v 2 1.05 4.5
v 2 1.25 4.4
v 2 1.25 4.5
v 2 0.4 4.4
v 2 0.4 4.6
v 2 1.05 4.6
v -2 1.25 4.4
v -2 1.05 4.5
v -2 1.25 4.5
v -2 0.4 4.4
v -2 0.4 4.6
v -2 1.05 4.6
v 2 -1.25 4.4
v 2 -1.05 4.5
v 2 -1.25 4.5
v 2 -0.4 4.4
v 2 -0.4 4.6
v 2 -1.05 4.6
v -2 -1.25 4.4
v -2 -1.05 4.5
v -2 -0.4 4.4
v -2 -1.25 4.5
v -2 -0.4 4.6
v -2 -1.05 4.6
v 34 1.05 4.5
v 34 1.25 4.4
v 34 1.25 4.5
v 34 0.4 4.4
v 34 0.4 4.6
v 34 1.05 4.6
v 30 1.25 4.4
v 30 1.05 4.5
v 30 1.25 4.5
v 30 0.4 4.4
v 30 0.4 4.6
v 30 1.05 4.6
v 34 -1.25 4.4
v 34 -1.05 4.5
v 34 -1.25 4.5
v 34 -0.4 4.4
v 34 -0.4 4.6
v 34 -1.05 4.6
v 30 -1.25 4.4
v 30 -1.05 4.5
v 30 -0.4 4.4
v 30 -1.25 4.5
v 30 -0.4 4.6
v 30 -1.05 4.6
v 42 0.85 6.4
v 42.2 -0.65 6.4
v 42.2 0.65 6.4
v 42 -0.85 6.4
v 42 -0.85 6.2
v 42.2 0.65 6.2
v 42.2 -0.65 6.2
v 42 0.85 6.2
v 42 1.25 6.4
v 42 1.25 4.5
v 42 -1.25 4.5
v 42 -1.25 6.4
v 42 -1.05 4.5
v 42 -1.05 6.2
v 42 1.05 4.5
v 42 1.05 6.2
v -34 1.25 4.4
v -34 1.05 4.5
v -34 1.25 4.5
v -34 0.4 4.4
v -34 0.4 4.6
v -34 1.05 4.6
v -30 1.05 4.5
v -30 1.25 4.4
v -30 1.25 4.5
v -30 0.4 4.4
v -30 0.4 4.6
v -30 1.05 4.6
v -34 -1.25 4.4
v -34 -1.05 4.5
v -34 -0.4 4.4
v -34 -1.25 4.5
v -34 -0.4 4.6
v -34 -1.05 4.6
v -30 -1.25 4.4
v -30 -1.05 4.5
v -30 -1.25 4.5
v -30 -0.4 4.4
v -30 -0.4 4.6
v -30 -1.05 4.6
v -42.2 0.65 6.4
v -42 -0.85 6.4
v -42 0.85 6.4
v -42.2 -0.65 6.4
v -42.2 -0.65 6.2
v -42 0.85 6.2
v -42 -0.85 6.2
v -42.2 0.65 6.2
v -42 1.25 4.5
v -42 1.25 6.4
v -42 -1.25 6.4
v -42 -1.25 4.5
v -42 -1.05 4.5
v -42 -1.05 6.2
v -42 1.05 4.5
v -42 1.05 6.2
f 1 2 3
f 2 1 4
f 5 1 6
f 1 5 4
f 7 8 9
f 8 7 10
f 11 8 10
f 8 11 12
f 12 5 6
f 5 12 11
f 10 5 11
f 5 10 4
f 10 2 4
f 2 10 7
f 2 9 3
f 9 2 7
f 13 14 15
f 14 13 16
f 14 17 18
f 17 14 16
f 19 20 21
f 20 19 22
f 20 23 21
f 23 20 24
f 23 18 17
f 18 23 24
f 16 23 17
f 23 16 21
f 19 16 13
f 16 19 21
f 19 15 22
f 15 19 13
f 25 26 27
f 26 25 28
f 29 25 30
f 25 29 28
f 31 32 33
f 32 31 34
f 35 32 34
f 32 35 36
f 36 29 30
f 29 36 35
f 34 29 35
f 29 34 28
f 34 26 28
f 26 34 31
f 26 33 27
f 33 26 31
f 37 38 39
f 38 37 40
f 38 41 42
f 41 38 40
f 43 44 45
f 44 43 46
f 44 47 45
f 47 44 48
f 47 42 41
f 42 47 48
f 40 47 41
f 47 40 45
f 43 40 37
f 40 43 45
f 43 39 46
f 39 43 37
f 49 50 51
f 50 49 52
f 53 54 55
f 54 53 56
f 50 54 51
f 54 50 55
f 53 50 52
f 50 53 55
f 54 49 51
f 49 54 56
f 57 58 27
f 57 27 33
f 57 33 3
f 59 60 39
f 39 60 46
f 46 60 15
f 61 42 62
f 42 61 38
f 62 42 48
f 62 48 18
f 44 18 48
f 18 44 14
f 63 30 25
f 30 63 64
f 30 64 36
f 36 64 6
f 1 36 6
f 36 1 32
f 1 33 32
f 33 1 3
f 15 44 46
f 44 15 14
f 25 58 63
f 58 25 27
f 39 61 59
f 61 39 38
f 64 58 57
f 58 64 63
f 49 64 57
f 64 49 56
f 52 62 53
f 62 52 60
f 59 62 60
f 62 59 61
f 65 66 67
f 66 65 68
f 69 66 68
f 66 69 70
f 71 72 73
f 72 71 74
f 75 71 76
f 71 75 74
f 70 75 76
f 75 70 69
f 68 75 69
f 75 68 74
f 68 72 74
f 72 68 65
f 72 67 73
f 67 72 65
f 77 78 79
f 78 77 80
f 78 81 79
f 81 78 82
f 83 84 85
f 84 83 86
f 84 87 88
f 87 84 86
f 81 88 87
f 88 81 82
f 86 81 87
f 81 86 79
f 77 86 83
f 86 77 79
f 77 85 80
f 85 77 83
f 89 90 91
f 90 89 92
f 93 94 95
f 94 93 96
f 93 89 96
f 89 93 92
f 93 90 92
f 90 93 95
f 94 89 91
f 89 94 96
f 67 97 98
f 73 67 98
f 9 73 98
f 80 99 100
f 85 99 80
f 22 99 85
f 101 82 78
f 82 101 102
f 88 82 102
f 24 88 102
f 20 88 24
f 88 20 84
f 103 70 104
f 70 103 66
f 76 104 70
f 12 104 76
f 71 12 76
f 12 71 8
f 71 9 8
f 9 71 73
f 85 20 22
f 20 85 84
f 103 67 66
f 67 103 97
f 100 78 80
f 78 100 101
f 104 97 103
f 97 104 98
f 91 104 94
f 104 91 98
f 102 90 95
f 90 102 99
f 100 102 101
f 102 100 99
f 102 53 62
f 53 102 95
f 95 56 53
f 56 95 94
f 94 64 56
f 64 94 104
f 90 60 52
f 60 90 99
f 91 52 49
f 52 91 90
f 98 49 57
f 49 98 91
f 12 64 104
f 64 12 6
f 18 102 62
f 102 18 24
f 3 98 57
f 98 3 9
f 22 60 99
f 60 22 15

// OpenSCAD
// file: ../p/rect3.scad
use <../lib.scad>
function ldraw_lib__rect3() = [
// 0 Rectangle with 3 Edges
// 0 Name: rect3.dat
// 0 Author: Mark Kennedy [mkennedy]
// 0 !LDRAW_ORG Primitive UPDATE 2010-01
// 0 !LICENSE Licensed under CC BY 4.0 : see CAreadme.txt
// 
// 0 BFC CERTIFY CCW
  [0,"BFC","CERTIFY"],
  [0,"BFC","CCW"],
// 
// 0 !HISTORY 2003-08-01 [PTadmin] Official Update 2003-02
// 0 !HISTORY 2007-06-24 [PTadmin] Header formatted for Contributor Agreement
// 0 !HISTORY 2008-07-01 [PTadmin] Official Update 2008-01
// 0 !HISTORY 2010-01-17 [mikeheide] Change winding to CCW
// 0 !HISTORY 2010-04-05 [PTadmin] Official Update 2010-01
// 
// 
// 2 24 1 0 1 -1 0 1
  [2,24,1,0,1,-1,0,1],
// 2 24 1 0 1 1 0 -1
  [2,24,1,0,1,1,0,-1],
// 2 24 -1 0 1 -1 0 -1
  [2,24,-1,0,1,-1,0,-1],
// 4 16 -1 0 1 -1 0 -1 1 0 -1 1 0 1
  [4,16,-1,0,1,-1,0,-1,1,0,-1,1,0,1],
// 0 //
];
module ldraw_lib__rect3(step=0, col=false, unit=2/5, alt=false, line=0.2, solid=!$preview)
    makepoly(ldraw_lib__rect3(), step=step, col=col, unit=unit, alt=alt, line=line, solid=solid);
ldraw_lib__rect3(line=0.2);
// file: ../p/rect.scad
use <../lib.scad>
function ldraw_lib__rect() = [
// 0 Rectangle
// 0 Name: rect.dat
// 0 Author: James Jessiman
// 0 !LDRAW_ORG Primitive UPDATE 2010-01
// 0 !LICENSE Licensed under CC BY 4.0 : see CAreadme.txt
// 
// 0 BFC CERTIFY CCW
  [0,"BFC","CERTIFY"],
  [0,"BFC","CCW"],
// 
// 0 !HISTORY 2002-04-05 [hafhead] Added BFC statement
// 0 !HISTORY 2002-04-25 [PTadmin] Official Update 2002-02
// 0 !HISTORY 2007-06-24 [PTadmin] Header formatted for Contributor Agreement
// 0 !HISTORY 2008-07-01 [PTadmin] Official Update 2008-01
// 0 !HISTORY 2010-01-17 [mikeheide] changed winding to CCW
// 0 !HISTORY 2010-04-05 [PTadmin] Official Update 2010-01
// 
// 
// 2 24 1 0 1 -1 0 1
  [2,24,1,0,1,-1,0,1],
// 2 24 -1 0 1 -1 0 -1
  [2,24,-1,0,1,-1,0,-1],
// 2 24 -1 0 -1 1 0 -1
  [2,24,-1,0,-1,1,0,-1],
// 2 24 1 0 -1 1 0 1
  [2,24,1,0,-1,1,0,1],
// 4 16 -1 0 1 -1 0 -1 1 0 -1 1 0 1
  [4,16,-1,0,1,-1,0,-1,1,0,-1,1,0,1],
// 0
];
module ldraw_lib__rect(step=0, col=false, unit=2/5, alt=false, line=0.2, solid=!$preview)
    makepoly(ldraw_lib__rect(), step=step, col=col, unit=unit, alt=alt, line=line, solid=solid);
ldraw_lib__rect(line=0.2);
// file: ../p/box2-7.scad
use <../lib.scad>
function ldraw_lib__box2_7() = [
// 0 Box with  2 Faces without  7 Edges
// 0 Name: box2-7.dat
// 0 Author: Willy Tschager [Holly-Wood]
// 0 !LDRAW_ORG Primitive UPDATE 2024-01
// 0 !LICENSE Licensed under CC BY 4.0 : see CAreadme.txt
// 
// 0 BFC CERTIFY CCW
  [0,"BFC","CERTIFY"],
  [0,"BFC","CCW"],
// 
// 0 !HISTORY 2009-05-02 [PTadmin] Official Update 2009-01
// 0 !HISTORY 2024-01-02 [Holly-Wood] Complete re-write, original by guyvivan
// 0 !HISTORY 2024-01-29 [OrionP] Official Update 2024-01
// 
// 2 24 -1 1 -1 -1 1 1
  [2,24,-1,1,-1,-1,1,1],
// 2 24 1 1 1 1 1 -1
  [2,24,1,1,1,1,1,-1],
// 4 16 -1 1 1 1 1 1 1 1 -1 -1 1 -1
  [4,16,-1,1,1,1,1,1,1,1,-1,-1,1,-1],
// 
// 2 24 -1 1 1 -1 -1 1
  [2,24,-1,1,1,-1,-1,1],
// 2 24 1 1 1 1 -1 1
  [2,24,1,1,1,1,-1,1],
// 4 16 1 -1 1 1 1 1 -1 1 1 -1 -1 1
  [4,16,1,-1,1,1,1,1,-1,1,1,-1,-1,1],
// 
// 2 24 -1 1 1 1 1 1
  [2,24,-1,1,1,1,1,1],
];
module ldraw_lib__box2_7(step=0, col=false, unit=2/5, alt=false, line=0.2, solid=!$preview)
    makepoly(ldraw_lib__box2_7(), step=step, col=col, unit=unit, alt=alt, line=line, solid=solid);
ldraw_lib__box2_7(line=0.2);
// file: ../p/box2-5.scad
use <../lib.scad>
function ldraw_lib__box2_5() = [
// 0 Box with 2 Faces without 5 Edges
// 0 Name: box2-5.dat
// 0 Author: Steffen [Steffen]
// 0 !LDRAW_ORG Primitive UPDATE 2003-03
// 0 !LICENSE Licensed under CC BY 4.0 : see CAreadme.txt
// 
// 0 BFC CERTIFY CCW
  [0,"BFC","CERTIFY"],
  [0,"BFC","CCW"],
// 
// 0 !HISTORY 2003-12-19 [PTadmin] Official Update 2003-03
// 0 !HISTORY 2007-06-24 [PTadmin] Header formatted for Contributor Agreement
// 0 !HISTORY 2008-07-01 [PTadmin] Official Update 2008-01
// 
// 
// 2 24 1 1 1 -1 1 1
  [2,24,1,1,1,-1,1,1],
// 2 24 1 1 -1 -1 1 -1
  [2,24,1,1,-1,-1,1,-1],
// 2 24 1 -1 1 -1 -1 1
  [2,24,1,-1,1,-1,-1,1],
// 2 24 -1 -1 1 -1 1 1
  [2,24,-1,-1,1,-1,1,1],
// 2 24 1 -1 1 1 1 1
  [2,24,1,-1,1,1,1,1],
// 2 24 -1 1 -1 -1 1 1
  [2,24,-1,1,-1,-1,1,1],
// 2 24 1 1 -1 1 1 1
  [2,24,1,1,-1,1,1,1],
// 4 16 1 1 1 1 1 -1 -1 1 -1 -1 1 1
  [4,16,1,1,1,1,1,-1,-1,1,-1,-1,1,1],
// 4 16 1 1 1 -1 1 1 -1 -1 1 1 -1 1
  [4,16,1,1,1,-1,1,1,-1,-1,1,1,-1,1],
// 0
];
module ldraw_lib__box2_5(step=0, col=false, unit=2/5, alt=false, line=0.2, solid=!$preview)
    makepoly(ldraw_lib__box2_5(), step=step, col=col, unit=unit, alt=alt, line=line, solid=solid);
ldraw_lib__box2_5(line=0.2);
// file: s/u9628s01.scad
use <../../lib.scad>
use <../../p/box2-5.scad>
use <../../p/rect.scad>
use <../../p/rect3.scad>
use <u9611s02.scad>
function ldraw_lib__s__u9628s01() = [
// 0 ~Train Track  9V Switch Right - Straight Metal Rail, Centre Section of Frog Rail, Half
// 0 Name: s\u9628s01.dat
// 0 Author: Max Martin Richter [MMR1988]
// 0 !LDRAW_ORG Subpart UPDATE 2025-08
// 0 !LICENSE Licensed under CC BY 4.0 : see CAreadme.txt
// 
// 0 BFC CERTIFY CCW
  [0,"BFC","CERTIFY"],
  [0,"BFC","CCW"],
// 
// 0 !HISTORY 2025-08-31 [OrionP] Official Update 2025-08
// 
// 1 16 80 0 0 1 0 0 0 1 0 0 0 1 s\u9611s02.dat
  [1,16,80,0,0,1,0,0,0,1,0,0,0,1, ldraw_lib__s__u9611s02()],
// 
// 4 16 105 -16 -2.125 105.5 -16 -1.625 105.5 -16 1.625 105 -16 2.125
  [4,16,105,-16,-2.125,105.5,-16,-1.625,105.5,-16,1.625,105,-16,2.125],
// 4 16 105.5 -15.5 1.625 105.5 -15.5 -1.625 105 -15.5 -2.125 105 -15.5 2.125
  [4,16,105.5,-15.5,1.625,105.5,-15.5,-1.625,105,-15.5,-2.125,105,-15.5,2.125],
// 1 16 105.25 -15.75 -.25 0 .25 0 .25 0 0 0 .25 -1.625 box2-5.dat
  [1,16,105.25,-15.75,-.25,0,.25,0,.25,0,0,0,.25,-1.625, ldraw_lib__box2_5()],
// 1 16 105.25 -15.75 1.875 0 -1 -.25 .25 0 0 0 0 .25 rect3.dat
  [1,16,105.25,-15.75,1.875,0,-1,-.25,.25,0,0,0,0,.25, ldraw_lib__rect3()],
// 
// 3 16 105 -16 3.125 105 -11.25 3.125 85 -11.25 3.125
  [3,16,105,-16,3.125,105,-11.25,3.125,85,-11.25,3.125],
// 3 16 105 -16 3.125 85 -11.25 3.125 75 -11.25 3.125
  [3,16,105,-16,3.125,85,-11.25,3.125,75,-11.25,3.125],
// 3 16 105 -16 3.125 75 -11.25 3.125 5 -11.25 3.125
  [3,16,105,-16,3.125,75,-11.25,3.125,5,-11.25,3.125],
// 
// 3 16 105 -11.25 -3.125 105 -16 -3.125 85 -11.25 -3.125
  [3,16,105,-11.25,-3.125,105,-16,-3.125,85,-11.25,-3.125],
// 3 16 85 -11.25 -3.125 105 -16 -3.125 75 -11.25 -3.125
  [3,16,85,-11.25,-3.125,105,-16,-3.125,75,-11.25,-3.125],
// 3 16 75 -11.25 -3.125 105 -16 -3.125 5 -11.25 -3.125
  [3,16,75,-11.25,-3.125,105,-16,-3.125,5,-11.25,-3.125],
// 
// 4 16 105 -11.25 -2.625 85 -11.25 -2.625 85 -11.5 -2.625 105 -15.5 -2.625
  [4,16,105,-11.25,-2.625,85,-11.25,-2.625,85,-11.5,-2.625,105,-15.5,-2.625],
// 3 16 105 -15.5 -2.625 85 -11.5 -2.625 75 -11.5 -2.625
  [3,16,105,-15.5,-2.625,85,-11.5,-2.625,75,-11.5,-2.625],
// 3 16 105 -15.5 -2.625 75 -11.5 -2.625 5 -11.5 -2.625
  [3,16,105,-15.5,-2.625,75,-11.5,-2.625,5,-11.5,-2.625],
// 4 16 5 -11.25 -2.625 5 -11.5 -2.625 75 -11.5 -2.625 75 -11.25 -2.625
  [4,16,5,-11.25,-2.625,5,-11.5,-2.625,75,-11.5,-2.625,75,-11.25,-2.625],
// 
// 4 16 85 -11.5 2.625 85 -11.25 2.625 105 -11.25 2.625 105 -15.5 2.625
  [4,16,85,-11.5,2.625,85,-11.25,2.625,105,-11.25,2.625,105,-15.5,2.625],
// 3 16 85 -11.5 2.625 105 -15.5 2.625 75 -11.5 2.625
  [3,16,85,-11.5,2.625,105,-15.5,2.625,75,-11.5,2.625],
// 3 16 75 -11.5 2.625 105 -15.5 2.625 5 -11.5 2.625
  [3,16,75,-11.5,2.625,105,-15.5,2.625,5,-11.5,2.625],
// 4 16 75 -11.5 2.625 5 -11.5 2.625 5 -11.25 2.625 75 -11.25 2.625
  [4,16,75,-11.5,2.625,5,-11.5,2.625,5,-11.25,2.625,75,-11.25,2.625],
// 
// 1 16 40 -11.25 2.875 35 0 0 0 -1 0 0 0 .25 rect.dat
  [1,16,40,-11.25,2.875,35,0,0,0,-1,0,0,0,.25, ldraw_lib__rect()],
// 1 16 40 -11.25 -2.875 35 0 0 0 -1 0 0 0 -.25 rect.dat
  [1,16,40,-11.25,-2.875,35,0,0,0,-1,0,0,0,-.25, ldraw_lib__rect()],
// 1 16 95 -11.25 2.875 10 0 0 0 -1 0 0 0 .25 rect.dat
  [1,16,95,-11.25,2.875,10,0,0,0,-1,0,0,0,.25, ldraw_lib__rect()],
// 1 16 95 -11.25 -2.875 10 0 0 0 -1 0 0 0 -.25 rect.dat
  [1,16,95,-11.25,-2.875,10,0,0,0,-1,0,0,0,-.25, ldraw_lib__rect()],
// 
// 4 16 105 -11.25 3.125 105 -16 3.125 105 -15.5 2.625 105 -11.25 2.625
  [4,16,105,-11.25,3.125,105,-16,3.125,105,-15.5,2.625,105,-11.25,2.625],
// 4 16 105 -15.5 2.625 105 -16 3.125 105 -16 2.125 105 -15.5 2.125
  [4,16,105,-15.5,2.625,105,-16,3.125,105,-16,2.125,105,-15.5,2.125],
// 4 16 105 -15.5 -2.125 105 -16 -2.125 105 -16 -3.125 105 -15.5 -2.625
  [4,16,105,-15.5,-2.125,105,-16,-2.125,105,-16,-3.125,105,-15.5,-2.625],
// 4 16 105 -15.5 -2.625 105 -16 -3.125 105 -11.25 -3.125 105 -11.25 -2.625
  [4,16,105,-15.5,-2.625,105,-16,-3.125,105,-11.25,-3.125,105,-11.25,-2.625],
];
module ldraw_lib__s__u9628s01(step=0, col=false, unit=2/5, alt=false, line=0.2, solid=!$preview)
    makepoly(ldraw_lib__s__u9628s01(), step=step, col=col, unit=unit, alt=alt, line=line, solid=solid);
ldraw_lib__s__u9628s01(line=0.2);
// file: s/u9611s02.scad
use <../../lib.scad>
use <../../p/box2-5.scad>
use <../../p/box2-7.scad>
function ldraw_lib__s__u9611s02() = [
// 0 ~Train Track  9V Straight - Metal Rail, Clamp
// 0 Name: s\u9611s02.dat
// 0 Author: Max Martin Richter [MMR1988]
// 0 !LDRAW_ORG Subpart UPDATE 2025-02
// 0 !LICENSE Licensed under CC BY 4.0 : see CAreadme.txt
// 
// 0 BFC CERTIFY CCW
  [0,"BFC","CERTIFY"],
  [0,"BFC","CCW"],
// 
// 0 !HISTORY 2025-02-27 [OrionP] Official Update 2025-02
// 
// 4 16 5 -11 3.125 5 -11.25 3.125 5 -11.25 2.625 5 -11 1
  [4,16,5,-11,3.125,5,-11.25,3.125,5,-11.25,2.625,5,-11,1],
// 4 16 5 -11.25 2.625 5 -11.5 2.625 5 -11.5 1 5 -11 1
  [4,16,5,-11.25,2.625,5,-11.5,2.625,5,-11.5,1,5,-11,1],
// 4 16 -5 -11.25 2.625 -5 -11.25 3.125 -5 -11 3.125 -5 -11 1
  [4,16,-5,-11.25,2.625,-5,-11.25,3.125,-5,-11,3.125,-5,-11,1],
// 4 16 -5 -11.25 2.625 -5 -11 1 -5 -11.5 1 -5 -11.5 2.625
  [4,16,-5,-11.25,2.625,-5,-11,1,-5,-11.5,1,-5,-11.5,2.625],
// 1 16 0 -11.25 1.8125 5 0 0 0 -.25 0 0 0 -.8125 box2-5.dat
  [1,16,0,-11.25,1.8125,5,0,0,0,-.25,0,0,0,-.8125, ldraw_lib__box2_5()],
// 1 16 0 -11.125 2.0625 5 0 0 0 .125 0 0 0 1.0625 box2-7.dat
  [1,16,0,-11.125,2.0625,5,0,0,0,.125,0,0,0,1.0625, ldraw_lib__box2_7()],
// 2 24 5 -11.5 2.625 5 -11.25 2.625
  [2,24,5,-11.5,2.625,5,-11.25,2.625],
// 2 24 -5 -11.5 2.625 -5 -11.25 2.625
  [2,24,-5,-11.5,2.625,-5,-11.25,2.625],
// 
// 4 16 5 -11.25 -2.625 5 -11.25 -3.125 5 -11 -3.125 5 -11 -1
  [4,16,5,-11.25,-2.625,5,-11.25,-3.125,5,-11,-3.125,5,-11,-1],
// 4 16 5 -11.5 -1 5 -11.5 -2.625 5 -11.25 -2.625 5 -11 -1
  [4,16,5,-11.5,-1,5,-11.5,-2.625,5,-11.25,-2.625,5,-11,-1],
// 4 16 -5 -11 -3.125 -5 -11.25 -3.125 -5 -11.25 -2.625 -5 -11 -1
  [4,16,-5,-11,-3.125,-5,-11.25,-3.125,-5,-11.25,-2.625,-5,-11,-1],
// 4 16 -5 -11.5 -1 -5 -11 -1 -5 -11.25 -2.625 -5 -11.5 -2.625
  [4,16,-5,-11.5,-1,-5,-11,-1,-5,-11.25,-2.625,-5,-11.5,-2.625],
// 1 16 0 -11.25 -1.8125 5 0 0 0 -.25 0 0 0 .8125 box2-5.dat
  [1,16,0,-11.25,-1.8125,5,0,0,0,-.25,0,0,0,.8125, ldraw_lib__box2_5()],
// 1 16 0 -11.125 -2.0625 5 0 0 0 .125 0 0 0 -1.0625 box2-7.dat
  [1,16,0,-11.125,-2.0625,5,0,0,0,.125,0,0,0,-1.0625, ldraw_lib__box2_7()],
// 2 24 5 -11.5 -2.625 5 -11.25 -2.625
  [2,24,5,-11.5,-2.625,5,-11.25,-2.625],
// 2 24 -5 -11.5 -2.625 -5 -11.25 -2.625
  [2,24,-5,-11.5,-2.625,-5,-11.25,-2.625],
];
module ldraw_lib__s__u9611s02(step=0, col=false, unit=2/5, alt=false, line=0.2, solid=!$preview)
    makepoly(ldraw_lib__s__u9611s02(), step=step, col=col, unit=unit, alt=alt, line=line, solid=solid);
ldraw_lib__s__u9611s02(line=0.2);
// file: ../p/recte3.scad
use <../lib.scad>
function ldraw_lib__recte3() = [
// 0 Rectangle Empty with 3 Edges
// 0 Name: recte3.dat
// 0 Author: Steffen [Steffen]
// 0 !LDRAW_ORG Primitive UPDATE 2011-01
// 0 !LICENSE Licensed under CC BY 4.0 : see CAreadme.txt
// 
// 0 BFC CERTIFY CCW
  [0,"BFC","CERTIFY"],
  [0,"BFC","CCW"],
// 
// 0 !HISTORY 2011-07-25 [PTadmin] Official Update 2011-01
// 
// 
// 2 24 1 0 1 -1 0 1
  [2,24,1,0,1,-1,0,1],
// 2 24 -1 0 1 -1 0 -1
  [2,24,-1,0,1,-1,0,-1],
// 2 24 1 0 -1 1 0 1
  [2,24,1,0,-1,1,0,1],
];
module ldraw_lib__recte3(step=0, col=false, unit=2/5, alt=false, line=0.2, solid=!$preview)
    makepoly(ldraw_lib__recte3(), step=step, col=col, unit=unit, alt=alt, line=line, solid=solid);
ldraw_lib__recte3(line=0.2);
// file: ../p/rect2p.scad
use <../lib.scad>
function ldraw_lib__rect2p() = [
// 0 Rectangle with 2 Parallel Edges
// 0 Name: rect2p.dat
// 0 Author: Donald Sutter [technog]
// 0 !LDRAW_ORG Primitive UPDATE 2010-01
// 0 !LICENSE Licensed under CC BY 4.0 : see CAreadme.txt
// 
// 0 BFC CERTIFY CCW
  [0,"BFC","CERTIFY"],
  [0,"BFC","CCW"],
// 
// 0 !HISTORY 2003-08-01 [PTadmin] Official Update 2003-02
// 0 !HISTORY 2007-06-24 [PTadmin] Header formatted for Contributor Agreement
// 0 !HISTORY 2008-07-01 [PTadmin] Official Update 2008-01
// 0 !HISTORY 2010-01-17 [mikeheide] changed winding to CCW
// 0 !HISTORY 2010-04-05 [PTadmin] Official Update 2010-01
// 
// 
// 2 24 1 0 1 -1 0 1
  [2,24,1,0,1,-1,0,1],
// 2 24 -1 0 -1 1 0 -1
  [2,24,-1,0,-1,1,0,-1],
// 4 16 -1 0 1 -1 0 -1 1 0 -1 1 0 1
  [4,16,-1,0,1,-1,0,-1,1,0,-1,1,0,1],
// 0
];
module ldraw_lib__rect2p(step=0, col=false, unit=2/5, alt=false, line=0.2, solid=!$preview)
    makepoly(ldraw_lib__rect2p(), step=step, col=col, unit=unit, alt=alt, line=line, solid=solid);
ldraw_lib__rect2p(line=0.2);
// main file
use <../lib.scad>
use <../p/rect2p.scad>
use <../p/recte3.scad>
use <s/u9611s02.scad>
use <s/u9628s01.scad>
function ldraw_lib__u9628() = [
// 0 ~Train Track  9V Switch Right - Straight Metal Rail, Closure Rail
// 0 Name: u9628.dat
// 0 Author: Max Martin Richter [MMR1988]
// 0 !LDRAW_ORG Part UPDATE 2025-08
// 0 !LICENSE Licensed under CC BY 4.0 : see CAreadme.txt
// 
// 0 BFC CERTIFY CCW
  [0,"BFC","CERTIFY"],
  [0,"BFC","CCW"],
// 
// 0 !HISTORY 2025-08-31 [OrionP] Official Update 2025-08
// 
// 1 16 0 0 0 1 0 0 0 1 0 0 0 1 s\u9611s02.dat
  [1,16,0,0,0,1,0,0,0,1,0,0,0,1, ldraw_lib__s__u9611s02()],
// 
// 1 16 0 0 0 1 0 0 0 1 0 0 0 1 s\u9628s01.dat
  [1,16,0,0,0,1,0,0,0,1,0,0,0,1, ldraw_lib__s__u9628s01()],
// 1 16 0 0 0 -1 0 0 0 1 0 0 0 1 s\u9628s01.dat
  [1,16,0,0,0,-1,0,0,0,1,0,0,0,1, ldraw_lib__s__u9628s01()],
// 
// 1 16 0 -15.5 -2.375 0 0 -105 0 -1 0 -.25 0 0 rect2p.dat
  [1,16,0,-15.5,-2.375,0,0,-105,0,-1,0,-.25,0,0, ldraw_lib__rect2p()],
// 4 16 105 -15.5 -2.125 -105 -15.5 -2.125 -105 -15.5 2.125 105 -15.5 2.125
  [4,16,105,-15.5,-2.125,-105,-15.5,-2.125,-105,-15.5,2.125,105,-15.5,2.125],
// 1 16 0 -15.5 2.375 0 0 -105 0 -1 0 -.25 0 0 rect2p.dat
  [1,16,0,-15.5,2.375,0,0,-105,0,-1,0,-.25,0,0, ldraw_lib__rect2p()],
// 
// 1 16 0 -16 -2.625 0 0 105 0 1 0 -.5 0 0 rect2p.dat
  [1,16,0,-16,-2.625,0,0,105,0,1,0,-.5,0,0, ldraw_lib__rect2p()],
// 4 16 105 -16 -2.125 105 -16 2.125 -105 -16 2.125 -105 -16 -2.125
  [4,16,105,-16,-2.125,105,-16,2.125,-105,-16,2.125,-105,-16,-2.125],
// 1 16 0 -16 2.625 0 0 105 0 1 0 -.5 0 0 rect2p.dat
  [1,16,0,-16,2.625,0,0,105,0,1,0,-.5,0,0, ldraw_lib__rect2p()],
// 
// 4 16 -5 -11.5 2.625 5 -11.5 2.625 105 -15.5 2.625 -105 -15.5 2.625
  [4,16,-5,-11.5,2.625,5,-11.5,2.625,105,-15.5,2.625,-105,-15.5,2.625],
// 
// 4 16 105 -15.5 -2.625 5 -11.5 -2.625 -5 -11.5 -2.625 -105 -15.5 -2.625
  [4,16,105,-15.5,-2.625,5,-11.5,-2.625,-5,-11.5,-2.625,-105,-15.5,-2.625],
// 
// 4 16 -105 -16 3.125 105 -16 3.125 5 -11.25 3.125 -5 -11.25 3.125
  [4,16,-105,-16,3.125,105,-16,3.125,5,-11.25,3.125,-5,-11.25,3.125],
// 
// 4 16 5 -11.25 -3.125 105 -16 -3.125 -105 -16 -3.125 -5 -11.25 -3.125
  [4,16,5,-11.25,-3.125,105,-16,-3.125,-105,-16,-3.125,-5,-11.25,-3.125],
// 
// 1 16 0 -13.625 3.125 105 0 0 0 0 -2.375 0 1 0 recte3.dat
  [1,16,0,-13.625,3.125,105,0,0,0,0,-2.375,0,1,0, ldraw_lib__recte3()],
// 1 16 0 -13.625 -3.125 105 0 0 0 0 -2.375 0 1 0 recte3.dat
  [1,16,0,-13.625,-3.125,105,0,0,0,0,-2.375,0,1,0, ldraw_lib__recte3()],
// 
// 1 16 0 -13.375 2.625 105 0 0 0 0 -2.125 0 1 0 recte3.dat
  [1,16,0,-13.375,2.625,105,0,0,0,0,-2.125,0,1,0, ldraw_lib__recte3()],
// 1 16 0 -13.375 -2.625 105 0 0 0 0 -2.125 0 1 0 recte3.dat
  [1,16,0,-13.375,-2.625,105,0,0,0,0,-2.125,0,1,0, ldraw_lib__recte3()],
];
module ldraw_lib__u9628(step=0, col=false, unit=2/5, alt=false, line=0.2, solid=!$preview)
    makepoly(ldraw_lib__u9628(), step=step, col=col, unit=unit, alt=alt, line=line, solid=solid);
ldraw_lib__u9628(line=0.2);
